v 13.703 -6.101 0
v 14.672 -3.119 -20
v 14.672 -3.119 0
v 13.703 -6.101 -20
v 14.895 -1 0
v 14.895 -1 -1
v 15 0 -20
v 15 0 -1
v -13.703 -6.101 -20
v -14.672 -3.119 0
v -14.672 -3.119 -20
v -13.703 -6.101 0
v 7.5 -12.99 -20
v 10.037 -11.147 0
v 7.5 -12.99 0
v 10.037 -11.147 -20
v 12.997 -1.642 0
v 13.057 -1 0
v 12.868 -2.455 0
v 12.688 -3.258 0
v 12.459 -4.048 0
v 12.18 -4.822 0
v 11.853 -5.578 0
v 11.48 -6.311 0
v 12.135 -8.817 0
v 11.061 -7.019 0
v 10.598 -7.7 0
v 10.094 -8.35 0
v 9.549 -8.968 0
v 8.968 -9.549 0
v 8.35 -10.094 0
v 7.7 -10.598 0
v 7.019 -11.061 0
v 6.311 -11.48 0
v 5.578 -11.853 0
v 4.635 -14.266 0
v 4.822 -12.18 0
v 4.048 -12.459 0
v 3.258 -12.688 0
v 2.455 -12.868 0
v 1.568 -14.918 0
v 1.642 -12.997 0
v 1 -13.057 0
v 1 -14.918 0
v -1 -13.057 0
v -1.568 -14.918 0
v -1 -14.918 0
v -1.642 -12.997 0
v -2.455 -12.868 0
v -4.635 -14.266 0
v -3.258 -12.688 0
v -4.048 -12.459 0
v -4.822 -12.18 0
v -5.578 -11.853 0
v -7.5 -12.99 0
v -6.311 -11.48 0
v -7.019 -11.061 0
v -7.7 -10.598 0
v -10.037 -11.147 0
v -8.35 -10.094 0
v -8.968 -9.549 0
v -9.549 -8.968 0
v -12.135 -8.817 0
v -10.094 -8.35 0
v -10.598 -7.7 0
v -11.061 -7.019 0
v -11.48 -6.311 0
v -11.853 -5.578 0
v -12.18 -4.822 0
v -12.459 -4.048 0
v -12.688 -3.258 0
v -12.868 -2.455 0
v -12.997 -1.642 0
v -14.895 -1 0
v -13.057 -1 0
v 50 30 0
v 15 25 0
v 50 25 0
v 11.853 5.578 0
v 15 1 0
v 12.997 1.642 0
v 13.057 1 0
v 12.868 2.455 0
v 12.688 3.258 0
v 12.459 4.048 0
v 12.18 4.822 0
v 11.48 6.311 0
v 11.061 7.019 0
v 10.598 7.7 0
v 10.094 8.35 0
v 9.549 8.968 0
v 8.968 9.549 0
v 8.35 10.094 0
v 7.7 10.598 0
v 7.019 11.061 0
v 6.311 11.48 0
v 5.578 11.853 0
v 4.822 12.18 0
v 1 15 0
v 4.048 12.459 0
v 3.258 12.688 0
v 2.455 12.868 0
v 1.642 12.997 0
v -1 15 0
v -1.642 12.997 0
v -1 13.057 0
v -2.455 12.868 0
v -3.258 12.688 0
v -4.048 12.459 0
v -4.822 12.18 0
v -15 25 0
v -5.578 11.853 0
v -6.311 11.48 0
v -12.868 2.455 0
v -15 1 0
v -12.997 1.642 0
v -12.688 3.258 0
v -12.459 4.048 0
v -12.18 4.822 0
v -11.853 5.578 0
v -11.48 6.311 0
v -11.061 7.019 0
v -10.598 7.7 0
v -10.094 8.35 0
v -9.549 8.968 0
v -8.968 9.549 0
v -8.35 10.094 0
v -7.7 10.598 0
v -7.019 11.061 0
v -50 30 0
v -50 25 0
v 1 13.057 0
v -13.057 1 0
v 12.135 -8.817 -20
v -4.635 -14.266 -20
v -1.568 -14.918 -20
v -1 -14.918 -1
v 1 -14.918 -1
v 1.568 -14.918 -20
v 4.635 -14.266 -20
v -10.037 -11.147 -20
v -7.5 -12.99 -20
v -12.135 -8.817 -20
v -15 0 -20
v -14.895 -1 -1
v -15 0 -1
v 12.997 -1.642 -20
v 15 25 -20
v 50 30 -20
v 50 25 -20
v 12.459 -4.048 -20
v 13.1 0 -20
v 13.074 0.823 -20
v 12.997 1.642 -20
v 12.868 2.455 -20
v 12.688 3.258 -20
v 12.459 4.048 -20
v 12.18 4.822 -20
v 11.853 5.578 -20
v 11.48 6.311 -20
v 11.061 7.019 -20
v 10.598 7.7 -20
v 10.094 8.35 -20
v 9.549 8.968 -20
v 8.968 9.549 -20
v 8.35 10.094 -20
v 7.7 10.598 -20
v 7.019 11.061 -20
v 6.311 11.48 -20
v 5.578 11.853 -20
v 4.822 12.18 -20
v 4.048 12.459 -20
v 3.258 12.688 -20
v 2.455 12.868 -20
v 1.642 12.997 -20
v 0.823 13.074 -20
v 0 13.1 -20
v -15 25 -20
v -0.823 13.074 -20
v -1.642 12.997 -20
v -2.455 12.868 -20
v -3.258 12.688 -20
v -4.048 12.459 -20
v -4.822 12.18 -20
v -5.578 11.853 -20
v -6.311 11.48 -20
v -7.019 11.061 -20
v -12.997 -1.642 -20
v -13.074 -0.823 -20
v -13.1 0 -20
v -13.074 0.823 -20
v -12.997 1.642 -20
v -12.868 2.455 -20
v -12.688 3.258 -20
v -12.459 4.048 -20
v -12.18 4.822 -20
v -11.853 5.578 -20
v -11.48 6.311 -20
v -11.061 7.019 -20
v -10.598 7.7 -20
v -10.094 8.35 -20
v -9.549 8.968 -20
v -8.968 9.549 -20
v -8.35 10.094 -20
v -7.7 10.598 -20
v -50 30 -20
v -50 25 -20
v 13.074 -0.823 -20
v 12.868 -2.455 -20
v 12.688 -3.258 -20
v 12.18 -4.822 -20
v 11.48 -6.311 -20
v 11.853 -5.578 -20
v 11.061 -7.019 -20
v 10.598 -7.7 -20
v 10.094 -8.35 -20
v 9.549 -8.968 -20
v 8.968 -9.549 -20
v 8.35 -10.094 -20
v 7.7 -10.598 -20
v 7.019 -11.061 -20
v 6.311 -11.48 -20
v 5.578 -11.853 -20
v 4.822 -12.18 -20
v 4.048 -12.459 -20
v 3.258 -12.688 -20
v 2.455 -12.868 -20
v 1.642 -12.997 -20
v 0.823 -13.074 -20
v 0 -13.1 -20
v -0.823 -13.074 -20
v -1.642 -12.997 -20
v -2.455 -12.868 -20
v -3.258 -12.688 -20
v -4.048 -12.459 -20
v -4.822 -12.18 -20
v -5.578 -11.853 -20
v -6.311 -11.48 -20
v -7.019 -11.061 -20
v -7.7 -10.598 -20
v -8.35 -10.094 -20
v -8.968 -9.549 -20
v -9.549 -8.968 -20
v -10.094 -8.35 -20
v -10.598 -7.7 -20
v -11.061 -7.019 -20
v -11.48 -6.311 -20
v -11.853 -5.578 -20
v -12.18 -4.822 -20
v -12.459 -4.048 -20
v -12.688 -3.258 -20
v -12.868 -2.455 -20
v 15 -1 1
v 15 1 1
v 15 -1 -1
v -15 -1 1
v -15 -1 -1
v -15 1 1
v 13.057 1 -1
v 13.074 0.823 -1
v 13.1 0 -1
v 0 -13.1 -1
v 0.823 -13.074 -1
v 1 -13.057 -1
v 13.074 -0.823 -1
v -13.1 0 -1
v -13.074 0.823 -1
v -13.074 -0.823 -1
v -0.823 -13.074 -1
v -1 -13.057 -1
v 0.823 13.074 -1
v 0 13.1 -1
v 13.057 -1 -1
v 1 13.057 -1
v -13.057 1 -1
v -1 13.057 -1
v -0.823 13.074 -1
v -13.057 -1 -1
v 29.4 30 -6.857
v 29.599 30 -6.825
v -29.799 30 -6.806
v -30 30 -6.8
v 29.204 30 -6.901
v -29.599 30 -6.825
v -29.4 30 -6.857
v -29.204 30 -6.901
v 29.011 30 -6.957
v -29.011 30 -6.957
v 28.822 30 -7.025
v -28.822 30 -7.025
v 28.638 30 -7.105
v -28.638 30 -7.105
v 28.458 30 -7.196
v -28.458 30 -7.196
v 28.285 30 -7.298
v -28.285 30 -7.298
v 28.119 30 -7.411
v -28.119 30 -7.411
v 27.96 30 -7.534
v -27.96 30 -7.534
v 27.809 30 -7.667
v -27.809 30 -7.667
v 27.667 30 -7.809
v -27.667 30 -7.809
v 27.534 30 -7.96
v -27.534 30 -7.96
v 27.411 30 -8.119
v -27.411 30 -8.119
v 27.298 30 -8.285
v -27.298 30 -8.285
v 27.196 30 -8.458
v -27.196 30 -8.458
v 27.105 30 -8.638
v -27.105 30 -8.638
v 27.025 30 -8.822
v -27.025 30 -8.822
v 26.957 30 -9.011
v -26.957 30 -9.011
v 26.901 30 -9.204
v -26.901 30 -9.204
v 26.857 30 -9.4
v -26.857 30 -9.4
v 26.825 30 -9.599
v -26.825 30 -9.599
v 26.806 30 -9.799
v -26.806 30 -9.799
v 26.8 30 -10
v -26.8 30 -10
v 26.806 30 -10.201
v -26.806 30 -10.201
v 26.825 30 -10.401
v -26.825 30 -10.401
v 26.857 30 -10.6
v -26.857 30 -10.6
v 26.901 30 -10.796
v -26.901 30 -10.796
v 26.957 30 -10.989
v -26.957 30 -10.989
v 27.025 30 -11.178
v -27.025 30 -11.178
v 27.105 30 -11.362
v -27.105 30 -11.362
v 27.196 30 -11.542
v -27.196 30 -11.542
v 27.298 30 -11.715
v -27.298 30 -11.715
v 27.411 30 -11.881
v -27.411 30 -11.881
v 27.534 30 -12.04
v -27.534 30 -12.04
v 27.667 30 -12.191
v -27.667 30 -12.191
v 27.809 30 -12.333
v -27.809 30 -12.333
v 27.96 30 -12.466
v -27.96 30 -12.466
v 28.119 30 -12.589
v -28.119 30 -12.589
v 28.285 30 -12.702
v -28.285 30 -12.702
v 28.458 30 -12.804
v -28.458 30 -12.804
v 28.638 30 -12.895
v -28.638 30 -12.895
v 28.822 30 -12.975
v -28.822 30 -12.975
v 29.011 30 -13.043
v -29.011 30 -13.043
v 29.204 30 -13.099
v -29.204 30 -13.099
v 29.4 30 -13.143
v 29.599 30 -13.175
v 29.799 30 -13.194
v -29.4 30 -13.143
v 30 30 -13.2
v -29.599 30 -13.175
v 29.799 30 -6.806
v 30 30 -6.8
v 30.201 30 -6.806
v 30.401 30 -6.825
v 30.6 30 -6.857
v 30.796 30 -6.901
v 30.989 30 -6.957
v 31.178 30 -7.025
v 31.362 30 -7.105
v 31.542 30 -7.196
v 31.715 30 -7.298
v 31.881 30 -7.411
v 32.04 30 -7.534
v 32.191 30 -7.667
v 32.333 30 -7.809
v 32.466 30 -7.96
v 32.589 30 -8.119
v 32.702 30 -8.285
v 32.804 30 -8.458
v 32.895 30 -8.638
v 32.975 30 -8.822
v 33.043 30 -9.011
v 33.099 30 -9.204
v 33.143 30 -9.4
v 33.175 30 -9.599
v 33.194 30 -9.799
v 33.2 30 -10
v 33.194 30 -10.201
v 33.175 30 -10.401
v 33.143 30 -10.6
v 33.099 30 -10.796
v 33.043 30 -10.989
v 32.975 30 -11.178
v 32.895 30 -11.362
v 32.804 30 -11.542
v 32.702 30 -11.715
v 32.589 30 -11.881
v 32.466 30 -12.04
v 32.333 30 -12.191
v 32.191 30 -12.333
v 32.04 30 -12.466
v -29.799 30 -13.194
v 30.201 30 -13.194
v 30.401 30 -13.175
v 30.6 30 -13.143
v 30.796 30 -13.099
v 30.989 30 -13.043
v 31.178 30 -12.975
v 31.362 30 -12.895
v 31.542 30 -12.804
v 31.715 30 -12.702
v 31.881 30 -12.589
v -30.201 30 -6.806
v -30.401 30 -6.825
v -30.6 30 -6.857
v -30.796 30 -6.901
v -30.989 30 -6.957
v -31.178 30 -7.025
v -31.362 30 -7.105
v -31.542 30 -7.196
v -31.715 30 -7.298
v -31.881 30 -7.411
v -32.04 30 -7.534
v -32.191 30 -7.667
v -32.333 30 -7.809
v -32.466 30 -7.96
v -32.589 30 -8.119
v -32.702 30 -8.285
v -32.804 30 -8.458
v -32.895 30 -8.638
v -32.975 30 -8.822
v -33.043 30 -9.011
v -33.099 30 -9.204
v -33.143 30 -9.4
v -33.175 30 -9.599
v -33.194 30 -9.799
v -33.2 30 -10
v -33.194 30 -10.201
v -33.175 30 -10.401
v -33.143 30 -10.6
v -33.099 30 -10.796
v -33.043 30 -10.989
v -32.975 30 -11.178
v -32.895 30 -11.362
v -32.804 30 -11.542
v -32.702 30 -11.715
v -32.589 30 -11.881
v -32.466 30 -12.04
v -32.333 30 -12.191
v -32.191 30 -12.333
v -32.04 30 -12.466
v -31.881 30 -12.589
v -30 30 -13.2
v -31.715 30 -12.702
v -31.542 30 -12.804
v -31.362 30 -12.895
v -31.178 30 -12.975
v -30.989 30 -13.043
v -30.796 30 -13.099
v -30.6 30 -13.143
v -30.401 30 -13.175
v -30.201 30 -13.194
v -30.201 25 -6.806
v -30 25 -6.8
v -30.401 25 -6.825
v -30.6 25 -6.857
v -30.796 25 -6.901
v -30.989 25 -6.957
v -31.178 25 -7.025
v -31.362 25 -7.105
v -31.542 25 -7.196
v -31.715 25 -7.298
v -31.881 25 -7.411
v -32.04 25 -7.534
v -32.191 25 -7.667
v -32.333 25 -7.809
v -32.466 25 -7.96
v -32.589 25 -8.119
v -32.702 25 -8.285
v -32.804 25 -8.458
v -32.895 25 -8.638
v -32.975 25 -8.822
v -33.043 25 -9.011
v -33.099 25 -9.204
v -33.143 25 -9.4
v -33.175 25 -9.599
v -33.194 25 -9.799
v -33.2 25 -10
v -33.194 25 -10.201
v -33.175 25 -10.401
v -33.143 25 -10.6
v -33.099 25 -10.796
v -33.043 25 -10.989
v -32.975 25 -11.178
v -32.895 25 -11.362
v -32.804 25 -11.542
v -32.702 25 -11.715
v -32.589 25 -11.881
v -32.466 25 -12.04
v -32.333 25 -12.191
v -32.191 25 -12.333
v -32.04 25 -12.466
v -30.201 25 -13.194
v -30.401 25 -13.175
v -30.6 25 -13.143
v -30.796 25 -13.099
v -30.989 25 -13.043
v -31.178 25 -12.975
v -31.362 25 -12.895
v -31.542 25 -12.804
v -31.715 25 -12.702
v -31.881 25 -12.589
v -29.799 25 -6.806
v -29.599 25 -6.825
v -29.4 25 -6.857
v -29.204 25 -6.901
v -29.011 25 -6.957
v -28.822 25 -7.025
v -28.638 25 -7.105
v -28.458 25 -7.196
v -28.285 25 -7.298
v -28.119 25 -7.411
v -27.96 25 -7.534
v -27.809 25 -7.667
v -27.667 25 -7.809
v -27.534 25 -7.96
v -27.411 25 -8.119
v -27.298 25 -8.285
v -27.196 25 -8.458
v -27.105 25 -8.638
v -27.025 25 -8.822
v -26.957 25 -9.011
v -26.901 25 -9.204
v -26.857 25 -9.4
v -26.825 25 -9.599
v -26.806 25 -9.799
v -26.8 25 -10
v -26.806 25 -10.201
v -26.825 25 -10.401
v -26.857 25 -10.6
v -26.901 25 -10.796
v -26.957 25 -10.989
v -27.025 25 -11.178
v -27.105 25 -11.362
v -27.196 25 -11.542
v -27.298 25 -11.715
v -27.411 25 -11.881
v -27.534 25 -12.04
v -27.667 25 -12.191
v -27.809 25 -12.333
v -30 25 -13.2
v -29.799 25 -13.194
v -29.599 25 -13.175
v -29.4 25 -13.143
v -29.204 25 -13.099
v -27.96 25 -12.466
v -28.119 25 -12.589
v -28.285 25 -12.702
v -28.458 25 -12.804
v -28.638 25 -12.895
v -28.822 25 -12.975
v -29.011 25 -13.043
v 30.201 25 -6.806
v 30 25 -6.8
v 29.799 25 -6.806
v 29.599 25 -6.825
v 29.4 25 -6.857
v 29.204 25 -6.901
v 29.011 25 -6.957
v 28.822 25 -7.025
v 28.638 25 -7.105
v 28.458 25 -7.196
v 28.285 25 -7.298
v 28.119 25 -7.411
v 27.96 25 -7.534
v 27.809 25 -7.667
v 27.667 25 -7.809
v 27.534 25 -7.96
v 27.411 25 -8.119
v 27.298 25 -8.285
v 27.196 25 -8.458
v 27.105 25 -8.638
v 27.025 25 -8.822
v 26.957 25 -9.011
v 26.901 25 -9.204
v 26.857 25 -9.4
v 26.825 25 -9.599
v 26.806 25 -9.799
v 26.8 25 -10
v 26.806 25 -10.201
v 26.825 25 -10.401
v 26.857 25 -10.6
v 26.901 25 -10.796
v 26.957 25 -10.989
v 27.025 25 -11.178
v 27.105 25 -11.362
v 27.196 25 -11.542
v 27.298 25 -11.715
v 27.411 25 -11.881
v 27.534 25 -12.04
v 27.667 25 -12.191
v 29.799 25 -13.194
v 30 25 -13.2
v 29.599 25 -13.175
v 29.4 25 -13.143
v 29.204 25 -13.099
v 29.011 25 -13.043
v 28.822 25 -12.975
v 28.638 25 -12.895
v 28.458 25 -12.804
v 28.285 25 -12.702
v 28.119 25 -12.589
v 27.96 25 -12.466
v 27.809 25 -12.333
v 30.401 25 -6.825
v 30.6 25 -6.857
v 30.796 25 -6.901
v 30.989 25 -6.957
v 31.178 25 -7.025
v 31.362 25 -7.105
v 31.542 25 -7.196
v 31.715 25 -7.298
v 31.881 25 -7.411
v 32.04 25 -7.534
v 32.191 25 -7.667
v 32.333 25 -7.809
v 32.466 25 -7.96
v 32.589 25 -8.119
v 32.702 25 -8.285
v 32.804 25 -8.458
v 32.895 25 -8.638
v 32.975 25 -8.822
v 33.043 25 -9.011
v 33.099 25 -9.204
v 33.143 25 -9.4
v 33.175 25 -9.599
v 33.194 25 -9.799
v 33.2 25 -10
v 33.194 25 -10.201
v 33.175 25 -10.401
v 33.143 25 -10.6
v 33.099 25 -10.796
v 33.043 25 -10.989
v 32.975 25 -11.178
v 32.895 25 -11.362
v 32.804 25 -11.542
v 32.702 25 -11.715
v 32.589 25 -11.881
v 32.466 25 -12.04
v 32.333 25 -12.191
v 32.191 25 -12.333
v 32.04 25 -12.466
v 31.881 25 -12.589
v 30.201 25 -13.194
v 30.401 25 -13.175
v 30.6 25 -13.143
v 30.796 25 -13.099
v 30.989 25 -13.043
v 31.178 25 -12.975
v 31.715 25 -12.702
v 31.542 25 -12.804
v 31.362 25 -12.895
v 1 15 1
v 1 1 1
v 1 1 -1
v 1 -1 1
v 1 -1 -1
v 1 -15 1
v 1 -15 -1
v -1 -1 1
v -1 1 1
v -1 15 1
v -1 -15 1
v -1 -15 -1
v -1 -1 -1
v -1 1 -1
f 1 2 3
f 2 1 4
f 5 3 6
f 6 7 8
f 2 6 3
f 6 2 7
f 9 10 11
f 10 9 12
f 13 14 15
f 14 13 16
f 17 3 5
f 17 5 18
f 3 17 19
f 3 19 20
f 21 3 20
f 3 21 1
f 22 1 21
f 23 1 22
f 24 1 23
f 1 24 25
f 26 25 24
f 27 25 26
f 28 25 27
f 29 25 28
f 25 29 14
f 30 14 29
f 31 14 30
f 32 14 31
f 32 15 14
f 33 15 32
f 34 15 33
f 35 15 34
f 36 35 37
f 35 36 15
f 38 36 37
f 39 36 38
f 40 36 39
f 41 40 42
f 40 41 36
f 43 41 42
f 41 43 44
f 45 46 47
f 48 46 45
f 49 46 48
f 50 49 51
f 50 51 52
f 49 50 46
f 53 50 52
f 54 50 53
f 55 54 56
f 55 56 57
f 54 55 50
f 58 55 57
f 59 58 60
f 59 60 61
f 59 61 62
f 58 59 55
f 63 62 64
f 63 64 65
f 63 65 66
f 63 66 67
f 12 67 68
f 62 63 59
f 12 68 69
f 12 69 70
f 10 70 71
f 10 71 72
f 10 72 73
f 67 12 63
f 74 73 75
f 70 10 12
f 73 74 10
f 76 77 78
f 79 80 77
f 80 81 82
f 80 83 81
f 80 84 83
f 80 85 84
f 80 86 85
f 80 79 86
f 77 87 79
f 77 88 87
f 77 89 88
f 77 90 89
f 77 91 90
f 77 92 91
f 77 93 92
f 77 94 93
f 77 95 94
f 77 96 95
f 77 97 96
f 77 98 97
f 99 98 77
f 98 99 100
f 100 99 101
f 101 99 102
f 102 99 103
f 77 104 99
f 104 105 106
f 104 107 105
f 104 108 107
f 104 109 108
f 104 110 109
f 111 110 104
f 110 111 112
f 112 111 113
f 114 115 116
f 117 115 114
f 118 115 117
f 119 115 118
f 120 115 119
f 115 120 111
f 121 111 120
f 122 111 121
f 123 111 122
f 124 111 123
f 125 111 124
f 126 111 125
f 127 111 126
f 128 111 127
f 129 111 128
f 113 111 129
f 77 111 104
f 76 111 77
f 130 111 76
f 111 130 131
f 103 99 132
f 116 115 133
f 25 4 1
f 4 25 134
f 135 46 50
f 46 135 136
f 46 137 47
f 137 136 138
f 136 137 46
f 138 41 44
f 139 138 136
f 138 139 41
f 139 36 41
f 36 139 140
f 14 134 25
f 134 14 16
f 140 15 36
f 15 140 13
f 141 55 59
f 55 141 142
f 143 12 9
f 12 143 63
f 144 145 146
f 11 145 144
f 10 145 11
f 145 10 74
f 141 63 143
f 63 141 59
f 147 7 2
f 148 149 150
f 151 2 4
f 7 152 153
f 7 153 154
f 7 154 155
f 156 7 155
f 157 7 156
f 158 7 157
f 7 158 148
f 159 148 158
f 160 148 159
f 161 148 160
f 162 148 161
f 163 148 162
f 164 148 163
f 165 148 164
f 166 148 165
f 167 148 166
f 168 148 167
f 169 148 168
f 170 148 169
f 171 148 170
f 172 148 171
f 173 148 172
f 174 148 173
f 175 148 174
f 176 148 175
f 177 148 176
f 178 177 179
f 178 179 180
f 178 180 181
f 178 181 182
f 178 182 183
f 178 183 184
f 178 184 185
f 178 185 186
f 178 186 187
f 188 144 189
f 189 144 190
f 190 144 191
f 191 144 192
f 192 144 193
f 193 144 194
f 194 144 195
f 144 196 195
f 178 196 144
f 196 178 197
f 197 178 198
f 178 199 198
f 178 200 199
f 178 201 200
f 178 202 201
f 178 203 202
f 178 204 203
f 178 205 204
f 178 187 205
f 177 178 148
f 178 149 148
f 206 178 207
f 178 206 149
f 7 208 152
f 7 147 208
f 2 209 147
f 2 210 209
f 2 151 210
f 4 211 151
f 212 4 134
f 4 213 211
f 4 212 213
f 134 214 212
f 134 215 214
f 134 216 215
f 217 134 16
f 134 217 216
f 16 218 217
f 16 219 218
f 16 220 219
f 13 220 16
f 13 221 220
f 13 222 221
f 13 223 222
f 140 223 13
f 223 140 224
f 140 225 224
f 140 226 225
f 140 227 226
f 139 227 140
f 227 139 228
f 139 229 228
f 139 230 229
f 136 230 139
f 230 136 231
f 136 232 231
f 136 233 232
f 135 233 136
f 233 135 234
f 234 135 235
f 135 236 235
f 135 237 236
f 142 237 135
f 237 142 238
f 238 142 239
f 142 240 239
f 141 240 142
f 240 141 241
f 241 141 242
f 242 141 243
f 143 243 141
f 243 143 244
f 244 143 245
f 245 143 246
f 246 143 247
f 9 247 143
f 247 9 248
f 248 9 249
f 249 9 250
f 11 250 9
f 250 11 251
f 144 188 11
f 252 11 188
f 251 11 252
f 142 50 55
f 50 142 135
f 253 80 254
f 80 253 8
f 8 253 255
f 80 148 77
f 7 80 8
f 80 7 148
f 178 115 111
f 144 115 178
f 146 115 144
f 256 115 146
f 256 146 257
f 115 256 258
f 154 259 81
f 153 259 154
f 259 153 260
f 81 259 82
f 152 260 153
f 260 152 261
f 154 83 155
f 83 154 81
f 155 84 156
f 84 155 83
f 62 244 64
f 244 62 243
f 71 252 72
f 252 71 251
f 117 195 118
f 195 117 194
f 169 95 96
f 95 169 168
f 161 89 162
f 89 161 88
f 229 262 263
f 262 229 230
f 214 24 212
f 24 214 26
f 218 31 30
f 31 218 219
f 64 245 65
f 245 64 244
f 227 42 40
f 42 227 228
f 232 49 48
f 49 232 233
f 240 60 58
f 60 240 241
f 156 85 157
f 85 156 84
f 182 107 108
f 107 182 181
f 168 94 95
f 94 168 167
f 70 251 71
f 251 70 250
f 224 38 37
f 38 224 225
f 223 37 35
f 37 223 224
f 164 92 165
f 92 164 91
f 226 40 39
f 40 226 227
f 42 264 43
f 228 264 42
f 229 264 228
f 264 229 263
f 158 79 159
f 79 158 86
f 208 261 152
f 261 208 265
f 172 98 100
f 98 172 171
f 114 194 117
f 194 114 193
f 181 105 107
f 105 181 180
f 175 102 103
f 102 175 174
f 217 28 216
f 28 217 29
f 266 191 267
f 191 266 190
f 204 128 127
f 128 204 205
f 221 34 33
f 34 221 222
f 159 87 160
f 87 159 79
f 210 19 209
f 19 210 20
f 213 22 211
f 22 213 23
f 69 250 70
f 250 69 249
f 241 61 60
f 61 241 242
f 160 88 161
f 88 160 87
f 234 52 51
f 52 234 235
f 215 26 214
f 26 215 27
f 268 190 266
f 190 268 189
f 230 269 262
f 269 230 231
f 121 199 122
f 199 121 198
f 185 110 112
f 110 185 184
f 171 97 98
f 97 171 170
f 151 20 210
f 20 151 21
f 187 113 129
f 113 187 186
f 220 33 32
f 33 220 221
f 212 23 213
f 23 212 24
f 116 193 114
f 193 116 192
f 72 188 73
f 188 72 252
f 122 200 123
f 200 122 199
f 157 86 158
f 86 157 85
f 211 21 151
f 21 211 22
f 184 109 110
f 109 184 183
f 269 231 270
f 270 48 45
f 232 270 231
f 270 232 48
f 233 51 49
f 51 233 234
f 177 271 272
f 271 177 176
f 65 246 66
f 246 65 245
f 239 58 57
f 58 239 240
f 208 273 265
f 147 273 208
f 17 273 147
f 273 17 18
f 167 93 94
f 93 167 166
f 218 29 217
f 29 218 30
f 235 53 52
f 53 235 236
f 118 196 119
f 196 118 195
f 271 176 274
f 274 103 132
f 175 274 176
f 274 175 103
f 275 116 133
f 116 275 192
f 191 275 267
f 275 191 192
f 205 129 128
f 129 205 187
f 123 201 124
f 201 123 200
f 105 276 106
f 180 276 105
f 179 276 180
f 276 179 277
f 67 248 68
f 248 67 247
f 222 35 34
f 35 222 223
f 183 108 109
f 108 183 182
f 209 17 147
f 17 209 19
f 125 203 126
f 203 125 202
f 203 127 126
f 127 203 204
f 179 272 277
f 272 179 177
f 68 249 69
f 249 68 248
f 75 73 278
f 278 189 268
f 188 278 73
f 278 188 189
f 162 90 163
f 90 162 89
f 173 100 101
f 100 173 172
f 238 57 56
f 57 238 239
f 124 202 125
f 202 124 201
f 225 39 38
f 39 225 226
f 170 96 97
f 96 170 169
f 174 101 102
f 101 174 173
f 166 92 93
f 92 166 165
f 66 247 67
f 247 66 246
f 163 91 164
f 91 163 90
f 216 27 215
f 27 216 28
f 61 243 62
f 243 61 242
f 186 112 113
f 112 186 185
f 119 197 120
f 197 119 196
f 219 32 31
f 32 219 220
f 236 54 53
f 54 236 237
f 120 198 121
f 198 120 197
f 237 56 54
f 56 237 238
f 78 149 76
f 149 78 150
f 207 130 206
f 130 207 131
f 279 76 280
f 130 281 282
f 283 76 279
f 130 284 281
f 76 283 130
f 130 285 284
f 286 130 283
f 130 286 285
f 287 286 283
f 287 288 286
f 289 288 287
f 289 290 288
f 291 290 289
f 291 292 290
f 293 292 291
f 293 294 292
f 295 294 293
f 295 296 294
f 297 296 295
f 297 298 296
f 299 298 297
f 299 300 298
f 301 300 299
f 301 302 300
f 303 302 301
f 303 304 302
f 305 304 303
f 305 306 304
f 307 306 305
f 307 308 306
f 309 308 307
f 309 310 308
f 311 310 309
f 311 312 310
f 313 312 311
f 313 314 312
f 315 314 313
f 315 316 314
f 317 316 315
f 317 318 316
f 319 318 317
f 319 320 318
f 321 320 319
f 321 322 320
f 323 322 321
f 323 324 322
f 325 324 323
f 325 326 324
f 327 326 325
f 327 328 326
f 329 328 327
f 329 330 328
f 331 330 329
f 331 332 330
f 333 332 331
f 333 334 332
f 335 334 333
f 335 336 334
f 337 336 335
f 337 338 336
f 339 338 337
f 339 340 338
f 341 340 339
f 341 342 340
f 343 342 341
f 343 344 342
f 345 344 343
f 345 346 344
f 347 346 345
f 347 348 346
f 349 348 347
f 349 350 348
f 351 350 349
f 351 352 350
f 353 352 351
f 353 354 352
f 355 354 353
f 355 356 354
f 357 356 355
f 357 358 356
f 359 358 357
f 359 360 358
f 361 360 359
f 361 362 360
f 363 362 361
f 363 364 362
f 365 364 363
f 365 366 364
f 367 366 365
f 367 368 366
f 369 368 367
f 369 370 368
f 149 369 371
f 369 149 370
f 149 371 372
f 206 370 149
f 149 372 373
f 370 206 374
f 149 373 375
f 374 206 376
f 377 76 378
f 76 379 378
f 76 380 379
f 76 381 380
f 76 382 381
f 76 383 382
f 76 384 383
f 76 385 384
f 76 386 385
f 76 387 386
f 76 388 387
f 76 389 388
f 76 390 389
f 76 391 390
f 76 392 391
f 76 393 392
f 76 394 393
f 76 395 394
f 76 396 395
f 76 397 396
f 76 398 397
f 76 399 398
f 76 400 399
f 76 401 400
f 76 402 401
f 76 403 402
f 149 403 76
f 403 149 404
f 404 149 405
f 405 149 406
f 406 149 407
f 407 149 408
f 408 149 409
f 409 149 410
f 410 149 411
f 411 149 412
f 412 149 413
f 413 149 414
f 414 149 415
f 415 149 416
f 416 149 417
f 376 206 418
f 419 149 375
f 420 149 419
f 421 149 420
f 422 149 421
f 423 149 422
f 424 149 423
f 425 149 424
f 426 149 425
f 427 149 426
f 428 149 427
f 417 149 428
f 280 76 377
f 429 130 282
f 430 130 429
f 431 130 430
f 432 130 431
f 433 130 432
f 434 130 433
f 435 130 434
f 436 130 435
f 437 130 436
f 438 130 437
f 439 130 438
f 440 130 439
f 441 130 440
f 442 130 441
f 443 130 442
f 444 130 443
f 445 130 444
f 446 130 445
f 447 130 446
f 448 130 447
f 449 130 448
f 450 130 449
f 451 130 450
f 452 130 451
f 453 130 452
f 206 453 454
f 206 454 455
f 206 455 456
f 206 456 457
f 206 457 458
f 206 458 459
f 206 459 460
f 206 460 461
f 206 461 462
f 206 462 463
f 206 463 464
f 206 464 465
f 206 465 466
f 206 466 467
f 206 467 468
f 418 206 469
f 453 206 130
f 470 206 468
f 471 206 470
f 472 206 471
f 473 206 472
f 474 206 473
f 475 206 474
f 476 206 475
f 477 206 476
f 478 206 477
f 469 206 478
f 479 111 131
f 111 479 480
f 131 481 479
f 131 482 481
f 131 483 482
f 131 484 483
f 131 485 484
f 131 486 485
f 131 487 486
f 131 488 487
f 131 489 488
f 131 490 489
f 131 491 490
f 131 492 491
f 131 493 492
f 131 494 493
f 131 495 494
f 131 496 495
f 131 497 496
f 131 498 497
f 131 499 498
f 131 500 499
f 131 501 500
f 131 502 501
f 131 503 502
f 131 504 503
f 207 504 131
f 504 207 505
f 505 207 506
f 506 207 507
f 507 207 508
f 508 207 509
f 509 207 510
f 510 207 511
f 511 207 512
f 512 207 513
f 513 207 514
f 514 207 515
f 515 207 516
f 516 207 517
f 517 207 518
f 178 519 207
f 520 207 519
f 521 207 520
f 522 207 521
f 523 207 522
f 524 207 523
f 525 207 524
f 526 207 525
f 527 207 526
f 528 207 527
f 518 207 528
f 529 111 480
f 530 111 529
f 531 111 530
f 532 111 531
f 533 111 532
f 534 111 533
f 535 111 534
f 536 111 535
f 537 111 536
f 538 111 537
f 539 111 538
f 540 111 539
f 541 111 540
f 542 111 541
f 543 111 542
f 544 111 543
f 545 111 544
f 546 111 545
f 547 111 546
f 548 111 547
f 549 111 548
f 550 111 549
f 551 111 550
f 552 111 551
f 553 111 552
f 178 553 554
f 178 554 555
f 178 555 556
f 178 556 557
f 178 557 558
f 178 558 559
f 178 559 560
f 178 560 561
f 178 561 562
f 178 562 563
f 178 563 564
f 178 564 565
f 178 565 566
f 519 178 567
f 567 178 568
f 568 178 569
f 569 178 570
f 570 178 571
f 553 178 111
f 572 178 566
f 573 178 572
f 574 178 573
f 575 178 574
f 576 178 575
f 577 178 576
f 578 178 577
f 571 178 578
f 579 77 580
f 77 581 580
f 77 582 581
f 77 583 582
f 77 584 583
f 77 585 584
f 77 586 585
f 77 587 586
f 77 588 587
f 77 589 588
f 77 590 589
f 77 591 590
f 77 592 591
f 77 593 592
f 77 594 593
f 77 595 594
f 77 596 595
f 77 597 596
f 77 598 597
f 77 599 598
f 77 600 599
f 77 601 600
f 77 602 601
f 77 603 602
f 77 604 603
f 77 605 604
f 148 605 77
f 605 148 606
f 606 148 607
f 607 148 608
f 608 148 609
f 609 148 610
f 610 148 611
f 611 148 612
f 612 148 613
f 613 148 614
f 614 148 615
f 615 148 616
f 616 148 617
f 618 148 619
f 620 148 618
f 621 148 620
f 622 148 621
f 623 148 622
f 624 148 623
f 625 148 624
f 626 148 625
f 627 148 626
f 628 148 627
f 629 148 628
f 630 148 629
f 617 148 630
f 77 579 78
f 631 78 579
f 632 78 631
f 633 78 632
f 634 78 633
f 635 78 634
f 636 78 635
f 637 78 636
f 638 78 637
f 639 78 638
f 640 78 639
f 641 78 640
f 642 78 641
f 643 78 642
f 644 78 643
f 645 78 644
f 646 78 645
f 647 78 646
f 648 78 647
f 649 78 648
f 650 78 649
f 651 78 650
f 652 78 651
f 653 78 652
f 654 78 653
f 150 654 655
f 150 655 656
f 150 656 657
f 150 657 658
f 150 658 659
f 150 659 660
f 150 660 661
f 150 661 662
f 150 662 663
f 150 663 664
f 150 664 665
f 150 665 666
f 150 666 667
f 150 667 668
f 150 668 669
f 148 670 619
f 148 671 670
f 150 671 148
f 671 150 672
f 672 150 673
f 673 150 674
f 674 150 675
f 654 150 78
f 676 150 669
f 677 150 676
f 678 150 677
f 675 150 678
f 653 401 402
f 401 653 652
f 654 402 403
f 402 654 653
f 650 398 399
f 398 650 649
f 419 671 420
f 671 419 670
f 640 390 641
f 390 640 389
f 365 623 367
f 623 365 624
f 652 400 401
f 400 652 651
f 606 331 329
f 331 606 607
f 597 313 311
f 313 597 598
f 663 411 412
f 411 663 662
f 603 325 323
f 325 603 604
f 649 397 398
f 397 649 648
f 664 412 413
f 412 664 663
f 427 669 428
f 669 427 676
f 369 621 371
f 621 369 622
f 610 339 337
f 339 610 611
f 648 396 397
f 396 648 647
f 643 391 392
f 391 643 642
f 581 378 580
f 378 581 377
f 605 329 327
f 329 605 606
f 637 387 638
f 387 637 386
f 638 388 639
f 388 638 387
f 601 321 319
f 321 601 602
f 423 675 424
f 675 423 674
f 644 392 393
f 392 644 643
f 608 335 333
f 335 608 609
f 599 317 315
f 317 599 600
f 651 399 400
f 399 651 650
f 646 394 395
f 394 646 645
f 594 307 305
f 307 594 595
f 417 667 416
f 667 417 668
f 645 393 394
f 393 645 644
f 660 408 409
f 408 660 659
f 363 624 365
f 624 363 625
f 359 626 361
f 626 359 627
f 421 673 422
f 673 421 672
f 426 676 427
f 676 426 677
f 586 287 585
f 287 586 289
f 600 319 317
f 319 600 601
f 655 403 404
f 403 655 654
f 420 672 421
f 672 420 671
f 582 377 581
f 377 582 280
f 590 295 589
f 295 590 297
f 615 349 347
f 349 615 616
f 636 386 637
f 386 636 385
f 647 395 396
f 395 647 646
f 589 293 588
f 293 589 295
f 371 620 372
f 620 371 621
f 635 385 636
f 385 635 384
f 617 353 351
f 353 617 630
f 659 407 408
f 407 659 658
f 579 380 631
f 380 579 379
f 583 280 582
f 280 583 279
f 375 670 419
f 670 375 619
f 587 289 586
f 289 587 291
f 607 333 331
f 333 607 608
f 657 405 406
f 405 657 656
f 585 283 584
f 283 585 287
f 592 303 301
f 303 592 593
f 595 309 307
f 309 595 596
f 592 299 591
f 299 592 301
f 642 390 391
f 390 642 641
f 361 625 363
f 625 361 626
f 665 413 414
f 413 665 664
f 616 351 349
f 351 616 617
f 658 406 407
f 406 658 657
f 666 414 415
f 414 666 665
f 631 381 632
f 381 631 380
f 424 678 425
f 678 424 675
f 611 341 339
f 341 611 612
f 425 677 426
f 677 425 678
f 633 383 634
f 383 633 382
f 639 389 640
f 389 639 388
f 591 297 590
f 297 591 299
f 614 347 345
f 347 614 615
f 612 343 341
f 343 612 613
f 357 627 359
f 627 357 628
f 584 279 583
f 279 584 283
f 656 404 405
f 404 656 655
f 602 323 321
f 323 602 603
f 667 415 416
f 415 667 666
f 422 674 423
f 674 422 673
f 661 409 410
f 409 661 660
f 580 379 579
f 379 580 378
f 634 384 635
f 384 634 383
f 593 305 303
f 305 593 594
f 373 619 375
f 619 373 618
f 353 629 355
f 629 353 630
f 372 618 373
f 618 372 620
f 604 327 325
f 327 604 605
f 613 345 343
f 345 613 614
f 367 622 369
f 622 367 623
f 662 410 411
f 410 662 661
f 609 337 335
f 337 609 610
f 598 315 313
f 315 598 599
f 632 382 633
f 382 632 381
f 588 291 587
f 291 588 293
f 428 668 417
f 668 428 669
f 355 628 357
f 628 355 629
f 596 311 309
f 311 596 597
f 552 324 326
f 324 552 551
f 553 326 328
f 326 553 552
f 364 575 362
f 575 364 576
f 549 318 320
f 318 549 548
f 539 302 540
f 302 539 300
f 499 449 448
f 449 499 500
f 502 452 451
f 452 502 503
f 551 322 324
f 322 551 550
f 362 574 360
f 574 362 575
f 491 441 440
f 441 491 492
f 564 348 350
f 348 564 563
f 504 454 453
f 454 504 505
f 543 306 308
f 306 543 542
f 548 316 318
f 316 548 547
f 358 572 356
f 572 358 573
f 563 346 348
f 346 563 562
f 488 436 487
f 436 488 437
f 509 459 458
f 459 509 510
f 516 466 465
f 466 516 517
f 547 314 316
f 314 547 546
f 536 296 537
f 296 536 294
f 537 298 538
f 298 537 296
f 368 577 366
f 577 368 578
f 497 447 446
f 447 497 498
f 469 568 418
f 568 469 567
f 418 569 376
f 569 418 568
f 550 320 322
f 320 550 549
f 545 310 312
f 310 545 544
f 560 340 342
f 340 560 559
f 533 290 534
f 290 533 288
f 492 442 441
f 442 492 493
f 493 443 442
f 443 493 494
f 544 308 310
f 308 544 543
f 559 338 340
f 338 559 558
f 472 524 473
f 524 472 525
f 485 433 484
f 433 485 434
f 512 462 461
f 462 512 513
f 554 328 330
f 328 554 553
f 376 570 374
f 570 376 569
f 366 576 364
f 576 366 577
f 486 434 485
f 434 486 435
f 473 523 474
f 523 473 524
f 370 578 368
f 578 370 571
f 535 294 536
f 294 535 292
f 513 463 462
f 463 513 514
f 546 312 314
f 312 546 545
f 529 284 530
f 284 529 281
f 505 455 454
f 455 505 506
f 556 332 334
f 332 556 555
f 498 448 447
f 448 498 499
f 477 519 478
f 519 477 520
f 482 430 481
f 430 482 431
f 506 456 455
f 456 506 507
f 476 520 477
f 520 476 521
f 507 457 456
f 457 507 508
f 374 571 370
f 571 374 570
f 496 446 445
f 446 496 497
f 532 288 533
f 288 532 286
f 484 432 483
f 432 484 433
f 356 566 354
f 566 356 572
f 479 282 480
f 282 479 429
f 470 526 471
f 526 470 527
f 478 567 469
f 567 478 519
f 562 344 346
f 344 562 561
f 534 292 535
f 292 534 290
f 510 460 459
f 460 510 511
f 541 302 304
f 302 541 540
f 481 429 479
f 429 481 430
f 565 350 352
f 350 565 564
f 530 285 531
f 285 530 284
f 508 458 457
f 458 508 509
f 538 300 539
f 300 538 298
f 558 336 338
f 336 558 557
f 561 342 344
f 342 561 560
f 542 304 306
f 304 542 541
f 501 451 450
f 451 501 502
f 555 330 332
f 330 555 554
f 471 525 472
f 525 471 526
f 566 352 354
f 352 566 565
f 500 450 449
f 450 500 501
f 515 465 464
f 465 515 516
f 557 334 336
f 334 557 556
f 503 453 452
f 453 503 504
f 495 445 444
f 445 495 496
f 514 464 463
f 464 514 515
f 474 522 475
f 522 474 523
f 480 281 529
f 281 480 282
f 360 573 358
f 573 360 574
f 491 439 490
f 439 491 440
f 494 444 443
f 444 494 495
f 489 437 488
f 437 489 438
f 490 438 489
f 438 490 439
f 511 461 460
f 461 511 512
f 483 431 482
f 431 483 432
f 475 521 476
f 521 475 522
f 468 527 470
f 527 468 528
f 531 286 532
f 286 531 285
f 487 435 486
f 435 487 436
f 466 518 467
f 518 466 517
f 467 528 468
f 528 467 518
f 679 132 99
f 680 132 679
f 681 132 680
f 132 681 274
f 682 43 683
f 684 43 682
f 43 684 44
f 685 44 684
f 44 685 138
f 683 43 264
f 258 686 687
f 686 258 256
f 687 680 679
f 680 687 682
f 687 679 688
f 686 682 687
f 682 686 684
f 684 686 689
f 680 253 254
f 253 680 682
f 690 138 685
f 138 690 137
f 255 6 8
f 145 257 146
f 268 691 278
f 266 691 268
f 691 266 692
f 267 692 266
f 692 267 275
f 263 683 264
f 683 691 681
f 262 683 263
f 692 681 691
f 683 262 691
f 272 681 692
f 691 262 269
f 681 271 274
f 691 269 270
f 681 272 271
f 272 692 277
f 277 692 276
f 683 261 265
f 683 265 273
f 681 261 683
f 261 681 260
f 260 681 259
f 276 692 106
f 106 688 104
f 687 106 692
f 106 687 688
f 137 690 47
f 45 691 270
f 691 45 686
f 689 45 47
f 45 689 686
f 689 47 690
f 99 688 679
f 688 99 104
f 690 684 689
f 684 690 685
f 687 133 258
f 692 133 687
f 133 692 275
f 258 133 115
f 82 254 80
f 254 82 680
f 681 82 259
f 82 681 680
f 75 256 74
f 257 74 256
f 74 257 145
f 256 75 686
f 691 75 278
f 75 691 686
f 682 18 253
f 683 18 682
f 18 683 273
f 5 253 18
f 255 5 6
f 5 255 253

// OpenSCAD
difference(){
    mount();
    translate([0,0,-25]){
        cylinder(30, 13.1, 13.1, $fn=100);
    }
    
    


}


difference(){
    translate([-50,25,-20]){
    cube([100,5,20]);
    }
    translate([30,40,-10]){
        rotate([90,0,0]){
            cylinder(20, 3.2, 3.2, $fn=100);
        }
    }
    translate([-30,40,-10]){
        rotate([90,0,0]){
            cylinder(20, 3.2, 3.2, $fn=100);
        }
    }

}


translate([-1,-15,-1]){
cube([2,30,2]);
}

translate([-15,-1,-1]){
    cube([30,2,2]);
}

module mount(){
    translate([0,0,-20]){
    cylinder(20,15, 15);
    } 
    translate([-15,0,-20]){
    cube([30,27.5,20]);
    }
    }
